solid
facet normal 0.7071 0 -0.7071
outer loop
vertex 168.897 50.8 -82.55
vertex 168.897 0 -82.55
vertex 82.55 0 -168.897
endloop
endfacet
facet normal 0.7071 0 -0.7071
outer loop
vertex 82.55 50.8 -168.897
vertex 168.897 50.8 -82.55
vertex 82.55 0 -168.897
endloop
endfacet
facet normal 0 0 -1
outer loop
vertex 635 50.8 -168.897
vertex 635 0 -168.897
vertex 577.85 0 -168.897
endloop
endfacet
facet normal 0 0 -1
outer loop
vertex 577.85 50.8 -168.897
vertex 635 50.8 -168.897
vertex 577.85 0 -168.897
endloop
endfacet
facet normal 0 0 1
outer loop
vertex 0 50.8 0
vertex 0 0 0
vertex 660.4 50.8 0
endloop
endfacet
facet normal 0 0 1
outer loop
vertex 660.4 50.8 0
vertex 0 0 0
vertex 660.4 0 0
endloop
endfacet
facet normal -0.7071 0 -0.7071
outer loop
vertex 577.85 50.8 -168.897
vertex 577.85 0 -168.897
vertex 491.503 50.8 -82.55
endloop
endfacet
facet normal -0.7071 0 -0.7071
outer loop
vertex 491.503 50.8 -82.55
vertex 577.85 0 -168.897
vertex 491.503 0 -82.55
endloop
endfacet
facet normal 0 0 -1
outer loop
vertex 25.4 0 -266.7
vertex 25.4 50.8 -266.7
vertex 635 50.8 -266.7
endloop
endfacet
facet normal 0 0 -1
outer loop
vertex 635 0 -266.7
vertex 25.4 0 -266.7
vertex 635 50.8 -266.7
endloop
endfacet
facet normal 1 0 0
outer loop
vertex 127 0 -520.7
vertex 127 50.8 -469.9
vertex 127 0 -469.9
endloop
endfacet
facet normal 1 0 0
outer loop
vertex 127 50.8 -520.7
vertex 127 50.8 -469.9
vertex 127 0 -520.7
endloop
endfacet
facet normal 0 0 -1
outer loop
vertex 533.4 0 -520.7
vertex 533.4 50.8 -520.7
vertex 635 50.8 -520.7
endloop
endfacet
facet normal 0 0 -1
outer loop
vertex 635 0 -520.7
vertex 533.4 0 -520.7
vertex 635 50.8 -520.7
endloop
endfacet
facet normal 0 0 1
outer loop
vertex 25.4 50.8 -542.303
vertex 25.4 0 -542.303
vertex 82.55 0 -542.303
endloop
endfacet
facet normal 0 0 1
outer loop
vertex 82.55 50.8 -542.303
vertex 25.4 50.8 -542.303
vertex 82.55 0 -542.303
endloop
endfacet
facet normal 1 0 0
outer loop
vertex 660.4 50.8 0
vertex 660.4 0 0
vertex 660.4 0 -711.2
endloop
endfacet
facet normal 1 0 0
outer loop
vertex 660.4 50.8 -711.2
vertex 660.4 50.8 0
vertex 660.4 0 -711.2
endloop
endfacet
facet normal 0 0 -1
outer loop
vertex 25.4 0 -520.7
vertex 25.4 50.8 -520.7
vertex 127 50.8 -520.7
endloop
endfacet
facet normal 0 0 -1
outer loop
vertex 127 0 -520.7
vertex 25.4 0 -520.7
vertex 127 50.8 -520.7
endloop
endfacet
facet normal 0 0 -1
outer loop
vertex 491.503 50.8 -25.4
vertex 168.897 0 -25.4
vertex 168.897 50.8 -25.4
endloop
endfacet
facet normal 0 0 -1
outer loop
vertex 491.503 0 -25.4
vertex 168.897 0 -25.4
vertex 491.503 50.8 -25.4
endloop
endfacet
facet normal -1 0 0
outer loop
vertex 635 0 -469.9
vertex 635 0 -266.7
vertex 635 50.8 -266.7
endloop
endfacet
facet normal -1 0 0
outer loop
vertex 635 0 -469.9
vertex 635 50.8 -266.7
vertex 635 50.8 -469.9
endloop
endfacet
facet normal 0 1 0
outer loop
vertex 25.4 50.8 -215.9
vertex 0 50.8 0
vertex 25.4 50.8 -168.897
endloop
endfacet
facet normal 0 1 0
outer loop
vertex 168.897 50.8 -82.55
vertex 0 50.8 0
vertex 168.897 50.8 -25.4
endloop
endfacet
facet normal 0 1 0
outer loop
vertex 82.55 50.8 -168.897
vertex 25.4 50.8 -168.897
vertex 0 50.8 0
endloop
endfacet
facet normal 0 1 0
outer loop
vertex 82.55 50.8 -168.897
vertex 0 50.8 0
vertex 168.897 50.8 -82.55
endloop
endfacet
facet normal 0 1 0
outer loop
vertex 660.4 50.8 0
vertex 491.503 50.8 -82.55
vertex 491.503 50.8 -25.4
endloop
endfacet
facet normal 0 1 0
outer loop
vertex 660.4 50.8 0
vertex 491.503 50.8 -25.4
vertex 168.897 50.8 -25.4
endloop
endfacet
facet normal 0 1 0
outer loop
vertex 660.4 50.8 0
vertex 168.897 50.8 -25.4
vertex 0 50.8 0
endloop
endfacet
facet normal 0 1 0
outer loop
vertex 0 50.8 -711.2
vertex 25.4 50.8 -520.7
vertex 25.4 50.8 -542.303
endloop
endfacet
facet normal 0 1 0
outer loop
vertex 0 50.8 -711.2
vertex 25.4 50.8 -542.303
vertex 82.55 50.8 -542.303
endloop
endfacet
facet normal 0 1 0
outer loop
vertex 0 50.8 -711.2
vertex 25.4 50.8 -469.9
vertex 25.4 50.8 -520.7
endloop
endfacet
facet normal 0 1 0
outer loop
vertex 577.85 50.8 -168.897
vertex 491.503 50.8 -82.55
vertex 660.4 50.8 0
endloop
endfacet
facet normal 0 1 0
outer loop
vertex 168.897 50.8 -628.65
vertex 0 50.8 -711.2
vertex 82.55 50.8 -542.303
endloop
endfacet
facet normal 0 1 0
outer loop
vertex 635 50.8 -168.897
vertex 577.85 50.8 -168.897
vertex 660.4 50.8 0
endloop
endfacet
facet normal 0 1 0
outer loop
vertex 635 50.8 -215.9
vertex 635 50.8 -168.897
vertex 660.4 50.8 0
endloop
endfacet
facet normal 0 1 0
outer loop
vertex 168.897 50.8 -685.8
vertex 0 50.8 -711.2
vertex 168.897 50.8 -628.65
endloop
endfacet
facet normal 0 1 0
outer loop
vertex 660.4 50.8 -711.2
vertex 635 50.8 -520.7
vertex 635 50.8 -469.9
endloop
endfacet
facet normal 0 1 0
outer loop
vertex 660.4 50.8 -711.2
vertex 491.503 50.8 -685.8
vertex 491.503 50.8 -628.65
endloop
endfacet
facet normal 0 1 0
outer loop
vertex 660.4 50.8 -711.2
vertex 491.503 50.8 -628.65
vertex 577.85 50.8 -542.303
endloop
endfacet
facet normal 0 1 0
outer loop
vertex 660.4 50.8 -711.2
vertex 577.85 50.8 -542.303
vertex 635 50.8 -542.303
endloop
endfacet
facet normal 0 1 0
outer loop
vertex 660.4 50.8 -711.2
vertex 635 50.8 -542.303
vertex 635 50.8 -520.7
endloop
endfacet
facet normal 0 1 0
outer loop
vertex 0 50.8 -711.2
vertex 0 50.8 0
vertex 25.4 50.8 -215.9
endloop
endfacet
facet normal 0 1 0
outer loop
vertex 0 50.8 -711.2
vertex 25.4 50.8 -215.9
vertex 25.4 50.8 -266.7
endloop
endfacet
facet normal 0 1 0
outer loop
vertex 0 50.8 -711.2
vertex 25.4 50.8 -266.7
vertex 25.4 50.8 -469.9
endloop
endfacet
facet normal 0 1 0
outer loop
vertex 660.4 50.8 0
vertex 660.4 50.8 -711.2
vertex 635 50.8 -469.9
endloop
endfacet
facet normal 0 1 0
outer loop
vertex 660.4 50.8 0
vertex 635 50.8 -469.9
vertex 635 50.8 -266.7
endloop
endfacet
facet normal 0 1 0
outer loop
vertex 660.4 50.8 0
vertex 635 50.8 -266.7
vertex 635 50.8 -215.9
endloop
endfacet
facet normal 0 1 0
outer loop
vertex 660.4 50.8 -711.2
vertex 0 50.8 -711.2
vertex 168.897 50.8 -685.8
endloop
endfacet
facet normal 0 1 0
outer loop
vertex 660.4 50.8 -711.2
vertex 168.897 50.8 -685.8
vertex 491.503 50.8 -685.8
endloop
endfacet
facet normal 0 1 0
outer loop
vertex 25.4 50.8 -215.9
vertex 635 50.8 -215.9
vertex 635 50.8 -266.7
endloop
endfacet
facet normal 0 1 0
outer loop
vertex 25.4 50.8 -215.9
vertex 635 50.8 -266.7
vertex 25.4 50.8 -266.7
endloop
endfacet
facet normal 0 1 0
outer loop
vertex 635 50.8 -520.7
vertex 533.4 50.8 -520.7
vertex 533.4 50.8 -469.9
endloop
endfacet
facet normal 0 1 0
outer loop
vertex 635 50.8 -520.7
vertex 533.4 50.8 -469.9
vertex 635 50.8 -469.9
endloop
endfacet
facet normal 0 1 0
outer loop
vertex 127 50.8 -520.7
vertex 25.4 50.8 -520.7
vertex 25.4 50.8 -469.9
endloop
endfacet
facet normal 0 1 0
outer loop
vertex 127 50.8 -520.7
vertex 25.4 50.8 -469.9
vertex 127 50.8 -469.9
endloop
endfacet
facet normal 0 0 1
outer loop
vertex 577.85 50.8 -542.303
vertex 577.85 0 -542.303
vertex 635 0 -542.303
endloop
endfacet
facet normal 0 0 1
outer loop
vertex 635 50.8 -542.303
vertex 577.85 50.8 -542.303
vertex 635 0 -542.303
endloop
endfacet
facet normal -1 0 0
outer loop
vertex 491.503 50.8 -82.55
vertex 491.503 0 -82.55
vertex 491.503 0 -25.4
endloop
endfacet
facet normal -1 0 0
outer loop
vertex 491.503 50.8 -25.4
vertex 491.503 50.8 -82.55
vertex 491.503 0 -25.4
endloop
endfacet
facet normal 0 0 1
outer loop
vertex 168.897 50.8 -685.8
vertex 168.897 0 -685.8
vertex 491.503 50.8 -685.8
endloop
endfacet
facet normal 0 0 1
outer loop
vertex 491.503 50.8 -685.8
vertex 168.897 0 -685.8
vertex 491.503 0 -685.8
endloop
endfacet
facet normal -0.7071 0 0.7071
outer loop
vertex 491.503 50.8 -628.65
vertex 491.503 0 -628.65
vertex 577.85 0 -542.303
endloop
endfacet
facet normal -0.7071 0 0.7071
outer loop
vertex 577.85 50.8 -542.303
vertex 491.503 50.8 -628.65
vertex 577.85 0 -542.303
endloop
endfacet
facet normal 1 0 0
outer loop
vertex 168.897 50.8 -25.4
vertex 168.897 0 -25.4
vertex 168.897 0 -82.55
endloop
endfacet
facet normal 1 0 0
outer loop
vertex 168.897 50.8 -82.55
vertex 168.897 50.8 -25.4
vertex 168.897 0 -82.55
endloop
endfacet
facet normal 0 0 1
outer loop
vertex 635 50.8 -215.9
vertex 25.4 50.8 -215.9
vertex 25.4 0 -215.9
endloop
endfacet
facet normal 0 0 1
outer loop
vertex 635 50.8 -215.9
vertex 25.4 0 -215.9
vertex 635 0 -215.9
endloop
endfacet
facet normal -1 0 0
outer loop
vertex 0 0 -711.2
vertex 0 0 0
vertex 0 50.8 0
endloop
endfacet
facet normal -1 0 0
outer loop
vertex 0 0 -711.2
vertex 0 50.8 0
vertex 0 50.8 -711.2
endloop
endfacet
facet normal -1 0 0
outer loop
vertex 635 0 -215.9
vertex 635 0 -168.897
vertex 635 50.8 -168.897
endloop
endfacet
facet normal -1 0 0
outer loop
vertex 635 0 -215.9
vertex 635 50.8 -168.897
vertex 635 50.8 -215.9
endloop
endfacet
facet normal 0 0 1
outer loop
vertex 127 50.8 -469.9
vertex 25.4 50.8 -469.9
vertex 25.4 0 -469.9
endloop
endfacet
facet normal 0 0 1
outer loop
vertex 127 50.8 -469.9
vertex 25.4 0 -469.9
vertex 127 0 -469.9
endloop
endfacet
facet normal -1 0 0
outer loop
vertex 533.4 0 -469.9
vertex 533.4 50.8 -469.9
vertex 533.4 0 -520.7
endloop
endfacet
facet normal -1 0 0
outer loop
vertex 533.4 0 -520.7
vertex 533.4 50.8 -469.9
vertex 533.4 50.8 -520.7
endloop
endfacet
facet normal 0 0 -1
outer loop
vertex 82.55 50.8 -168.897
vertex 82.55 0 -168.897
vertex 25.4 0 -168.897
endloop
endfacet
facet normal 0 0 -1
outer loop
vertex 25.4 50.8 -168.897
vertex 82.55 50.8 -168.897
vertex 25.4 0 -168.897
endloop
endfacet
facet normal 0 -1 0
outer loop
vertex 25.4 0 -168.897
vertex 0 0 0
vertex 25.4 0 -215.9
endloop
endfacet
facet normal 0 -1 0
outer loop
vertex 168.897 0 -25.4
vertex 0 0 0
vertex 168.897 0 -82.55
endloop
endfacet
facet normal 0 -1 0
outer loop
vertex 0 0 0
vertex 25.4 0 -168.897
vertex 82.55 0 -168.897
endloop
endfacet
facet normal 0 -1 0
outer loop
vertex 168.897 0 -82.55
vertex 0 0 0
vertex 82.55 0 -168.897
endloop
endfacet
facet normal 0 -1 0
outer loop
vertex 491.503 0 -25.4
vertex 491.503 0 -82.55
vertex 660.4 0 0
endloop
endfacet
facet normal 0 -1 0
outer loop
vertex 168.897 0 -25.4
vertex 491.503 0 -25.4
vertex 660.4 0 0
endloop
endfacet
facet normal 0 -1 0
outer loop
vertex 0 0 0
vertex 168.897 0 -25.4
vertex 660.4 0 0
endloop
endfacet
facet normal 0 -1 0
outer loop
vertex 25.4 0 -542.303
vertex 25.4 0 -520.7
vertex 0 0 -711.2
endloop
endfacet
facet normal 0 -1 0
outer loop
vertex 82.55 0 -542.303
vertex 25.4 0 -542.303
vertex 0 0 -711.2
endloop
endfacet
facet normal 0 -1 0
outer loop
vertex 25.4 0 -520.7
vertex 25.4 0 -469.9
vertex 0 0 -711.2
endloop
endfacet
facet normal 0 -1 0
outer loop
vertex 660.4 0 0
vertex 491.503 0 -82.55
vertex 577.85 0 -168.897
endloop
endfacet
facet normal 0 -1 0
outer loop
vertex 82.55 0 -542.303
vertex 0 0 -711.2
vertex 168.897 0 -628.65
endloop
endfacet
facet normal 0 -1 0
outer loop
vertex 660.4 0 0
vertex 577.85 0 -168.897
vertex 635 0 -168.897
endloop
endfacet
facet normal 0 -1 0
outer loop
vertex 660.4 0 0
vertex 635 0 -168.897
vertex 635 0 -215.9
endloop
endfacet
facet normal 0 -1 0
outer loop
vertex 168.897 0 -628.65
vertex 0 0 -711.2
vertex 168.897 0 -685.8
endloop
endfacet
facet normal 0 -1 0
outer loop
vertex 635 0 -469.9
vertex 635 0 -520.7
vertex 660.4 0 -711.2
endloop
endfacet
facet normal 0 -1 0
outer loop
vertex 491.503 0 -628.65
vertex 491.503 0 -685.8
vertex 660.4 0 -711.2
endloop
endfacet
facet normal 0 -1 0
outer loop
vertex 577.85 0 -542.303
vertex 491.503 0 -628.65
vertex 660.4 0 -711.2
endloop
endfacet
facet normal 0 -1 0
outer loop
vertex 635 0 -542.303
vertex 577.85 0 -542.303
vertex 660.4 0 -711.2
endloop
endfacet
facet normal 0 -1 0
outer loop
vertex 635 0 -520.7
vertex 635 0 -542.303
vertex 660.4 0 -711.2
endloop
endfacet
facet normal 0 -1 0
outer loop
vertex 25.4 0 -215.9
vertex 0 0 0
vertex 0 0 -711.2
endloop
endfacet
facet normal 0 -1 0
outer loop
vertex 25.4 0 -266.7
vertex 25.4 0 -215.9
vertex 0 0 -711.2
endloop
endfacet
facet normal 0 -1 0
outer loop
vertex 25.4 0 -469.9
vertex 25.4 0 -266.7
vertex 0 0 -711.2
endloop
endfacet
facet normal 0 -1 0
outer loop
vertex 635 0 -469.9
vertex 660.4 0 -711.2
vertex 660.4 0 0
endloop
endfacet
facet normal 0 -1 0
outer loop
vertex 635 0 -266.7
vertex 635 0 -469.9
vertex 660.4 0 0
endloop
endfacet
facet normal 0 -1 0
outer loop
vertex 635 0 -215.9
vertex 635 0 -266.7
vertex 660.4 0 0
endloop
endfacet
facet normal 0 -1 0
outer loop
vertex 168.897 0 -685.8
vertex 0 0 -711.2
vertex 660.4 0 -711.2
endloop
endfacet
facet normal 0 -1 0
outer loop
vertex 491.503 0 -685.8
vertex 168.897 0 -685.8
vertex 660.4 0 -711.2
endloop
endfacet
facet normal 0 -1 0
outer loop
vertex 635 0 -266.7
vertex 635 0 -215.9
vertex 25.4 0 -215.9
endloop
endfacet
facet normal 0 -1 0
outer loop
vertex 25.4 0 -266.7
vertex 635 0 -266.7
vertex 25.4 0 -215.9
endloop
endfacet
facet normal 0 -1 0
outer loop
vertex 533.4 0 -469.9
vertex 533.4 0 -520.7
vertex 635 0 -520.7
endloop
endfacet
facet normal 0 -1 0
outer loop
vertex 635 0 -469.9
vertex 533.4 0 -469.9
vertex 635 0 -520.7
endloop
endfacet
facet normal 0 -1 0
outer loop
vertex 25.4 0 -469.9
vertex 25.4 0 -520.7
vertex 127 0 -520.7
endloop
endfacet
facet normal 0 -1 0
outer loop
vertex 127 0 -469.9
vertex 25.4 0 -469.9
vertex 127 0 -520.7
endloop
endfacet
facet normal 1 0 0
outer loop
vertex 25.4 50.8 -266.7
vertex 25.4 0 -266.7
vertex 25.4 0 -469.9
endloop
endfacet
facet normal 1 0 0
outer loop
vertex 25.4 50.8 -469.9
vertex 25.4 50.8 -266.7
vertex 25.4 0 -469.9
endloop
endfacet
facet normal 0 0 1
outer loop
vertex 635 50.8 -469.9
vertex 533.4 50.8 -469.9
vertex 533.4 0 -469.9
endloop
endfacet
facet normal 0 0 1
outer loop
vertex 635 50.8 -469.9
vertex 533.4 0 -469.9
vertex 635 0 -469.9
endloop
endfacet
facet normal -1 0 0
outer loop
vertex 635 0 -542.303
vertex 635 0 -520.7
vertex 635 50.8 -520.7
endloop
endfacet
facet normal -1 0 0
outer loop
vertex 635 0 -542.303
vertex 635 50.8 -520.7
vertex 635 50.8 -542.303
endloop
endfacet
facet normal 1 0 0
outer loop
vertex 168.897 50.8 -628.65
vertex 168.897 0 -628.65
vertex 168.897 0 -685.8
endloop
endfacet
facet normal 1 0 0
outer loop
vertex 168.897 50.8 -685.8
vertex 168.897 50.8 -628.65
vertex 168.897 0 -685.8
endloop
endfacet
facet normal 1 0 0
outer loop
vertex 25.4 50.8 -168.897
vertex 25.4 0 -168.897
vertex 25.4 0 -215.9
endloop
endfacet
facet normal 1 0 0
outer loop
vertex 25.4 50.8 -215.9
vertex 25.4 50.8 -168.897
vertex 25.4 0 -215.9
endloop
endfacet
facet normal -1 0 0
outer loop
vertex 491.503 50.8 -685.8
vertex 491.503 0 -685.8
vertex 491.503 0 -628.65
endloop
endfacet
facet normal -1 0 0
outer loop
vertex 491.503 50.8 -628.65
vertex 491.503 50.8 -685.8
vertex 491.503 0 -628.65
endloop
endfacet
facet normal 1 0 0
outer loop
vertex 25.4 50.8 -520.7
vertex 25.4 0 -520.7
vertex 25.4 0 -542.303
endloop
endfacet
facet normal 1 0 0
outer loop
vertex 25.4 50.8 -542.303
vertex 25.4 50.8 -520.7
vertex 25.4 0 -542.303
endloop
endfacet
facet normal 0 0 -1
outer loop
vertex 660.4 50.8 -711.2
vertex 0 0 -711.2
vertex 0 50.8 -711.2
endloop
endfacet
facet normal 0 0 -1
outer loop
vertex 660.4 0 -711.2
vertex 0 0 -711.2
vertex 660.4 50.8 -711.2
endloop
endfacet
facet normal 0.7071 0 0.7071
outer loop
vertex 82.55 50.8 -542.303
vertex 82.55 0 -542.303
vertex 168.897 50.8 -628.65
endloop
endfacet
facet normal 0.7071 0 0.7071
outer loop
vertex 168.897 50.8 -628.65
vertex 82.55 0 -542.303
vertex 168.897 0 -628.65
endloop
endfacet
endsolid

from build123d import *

# Parameters (mm, degrees)
SKETCH1_W           = 660.4
SKETCH1_H           = 711.2
SKETCH1_W_2         = 609.6
SKETCH1_H_2         = 660.4
BOSS_EXTRUDE1_DEPTH = 50.8
SKETCH2_W           = 609.6
SKETCH2_H           = 50.8
BOSS_EXTRUDE2_DEPTH = 50.8
SKETCH3_W           = 406.4
SKETCH3_H           = 50.8
CUT_EXTRUDE2_DEPTH  = 972.861224661


with BuildPart() as part:
    # Sketch1 → Boss-Extrude1 (new body)
    # profile 1 of 5: a face of its own
    with BuildSketch(Plane(origin=(0, 0, 0), x_dir=(1, 0, 0), z_dir=(0, 1, 0))):
        with Locations((330.2, 355.6)):
            Rectangle(SKETCH1_W, SKETCH1_H)
        with Locations((330.2, 355.6)):
            Rectangle(SKETCH1_W_2, SKETCH1_H_2, mode=Mode.SUBTRACT)
    # profile 2 of 5: a face of its own
    with BuildSketch(Plane(origin=(0, 0, 0), x_dir=(1, 0, 0), z_dir=(0, 1, 0))):
        Polygon((82.55, 168.89717139), (25.4, 168.89717139), (25.4, 25.4), (168.89717139, 25.4), (168.89717139, 82.55), align=None)
    # profile 3 of 5: a face of its own
    with BuildSketch(Plane(origin=(0, 0, 0), x_dir=(1, 0, 0), z_dir=(0, 1, 0))):
        Polygon((491.50282861, 82.55), (491.50282861, 25.4), (635, 25.4), (635, 168.89717139), (577.85, 168.89717139), align=None)
    # profile 4 of 5: a face of its own
    with BuildSketch(Plane(origin=(0, 0, 0), x_dir=(1, 0, 0), z_dir=(0, 1, 0))):
        Polygon((635, 685.8), (491.50282861, 685.8), (491.50282861, 628.65), (577.85, 542.30282861), (635, 542.30282861), align=None)
    # profile 5 of 5: a face of its own
    with BuildSketch(Plane(origin=(0, 0, 0), x_dir=(1, 0, 0), z_dir=(0, 1, 0))):
        Polygon((25.4, 542.30282861), (82.55, 542.30282861), (168.89717139, 628.65), (168.89717139, 685.8), (25.4, 685.8), align=None)
    extrude(amount=BOSS_EXTRUDE1_DEPTH)

    # Sketch2 → Boss-Extrude2 (add)
    with BuildSketch(Plane(origin=(0, 50.8, 0), x_dir=(1, 0, 0), z_dir=(0, 1, 0))):
        with Locations((330.2, 241.3)):
            Rectangle(SKETCH2_W, SKETCH2_H)
        with Locations((330.2, 495.3)):
            Rectangle(SKETCH2_W, SKETCH2_H)
    extrude(amount=-BOSS_EXTRUDE2_DEPTH)

    # Sketch3 → Cut-Extrude2 (cut, through all)
    with BuildSketch(Plane(origin=(0, 50.8, 0), x_dir=(1, 0, 0), z_dir=(0, 1, 0))):
        with Locations((330.2, 495.3)):
            Rectangle(SKETCH3_W, SKETCH3_H)
    extrude(amount=-CUT_EXTRUDE2_DEPTH, mode=Mode.SUBTRACT)


solid = part.part
